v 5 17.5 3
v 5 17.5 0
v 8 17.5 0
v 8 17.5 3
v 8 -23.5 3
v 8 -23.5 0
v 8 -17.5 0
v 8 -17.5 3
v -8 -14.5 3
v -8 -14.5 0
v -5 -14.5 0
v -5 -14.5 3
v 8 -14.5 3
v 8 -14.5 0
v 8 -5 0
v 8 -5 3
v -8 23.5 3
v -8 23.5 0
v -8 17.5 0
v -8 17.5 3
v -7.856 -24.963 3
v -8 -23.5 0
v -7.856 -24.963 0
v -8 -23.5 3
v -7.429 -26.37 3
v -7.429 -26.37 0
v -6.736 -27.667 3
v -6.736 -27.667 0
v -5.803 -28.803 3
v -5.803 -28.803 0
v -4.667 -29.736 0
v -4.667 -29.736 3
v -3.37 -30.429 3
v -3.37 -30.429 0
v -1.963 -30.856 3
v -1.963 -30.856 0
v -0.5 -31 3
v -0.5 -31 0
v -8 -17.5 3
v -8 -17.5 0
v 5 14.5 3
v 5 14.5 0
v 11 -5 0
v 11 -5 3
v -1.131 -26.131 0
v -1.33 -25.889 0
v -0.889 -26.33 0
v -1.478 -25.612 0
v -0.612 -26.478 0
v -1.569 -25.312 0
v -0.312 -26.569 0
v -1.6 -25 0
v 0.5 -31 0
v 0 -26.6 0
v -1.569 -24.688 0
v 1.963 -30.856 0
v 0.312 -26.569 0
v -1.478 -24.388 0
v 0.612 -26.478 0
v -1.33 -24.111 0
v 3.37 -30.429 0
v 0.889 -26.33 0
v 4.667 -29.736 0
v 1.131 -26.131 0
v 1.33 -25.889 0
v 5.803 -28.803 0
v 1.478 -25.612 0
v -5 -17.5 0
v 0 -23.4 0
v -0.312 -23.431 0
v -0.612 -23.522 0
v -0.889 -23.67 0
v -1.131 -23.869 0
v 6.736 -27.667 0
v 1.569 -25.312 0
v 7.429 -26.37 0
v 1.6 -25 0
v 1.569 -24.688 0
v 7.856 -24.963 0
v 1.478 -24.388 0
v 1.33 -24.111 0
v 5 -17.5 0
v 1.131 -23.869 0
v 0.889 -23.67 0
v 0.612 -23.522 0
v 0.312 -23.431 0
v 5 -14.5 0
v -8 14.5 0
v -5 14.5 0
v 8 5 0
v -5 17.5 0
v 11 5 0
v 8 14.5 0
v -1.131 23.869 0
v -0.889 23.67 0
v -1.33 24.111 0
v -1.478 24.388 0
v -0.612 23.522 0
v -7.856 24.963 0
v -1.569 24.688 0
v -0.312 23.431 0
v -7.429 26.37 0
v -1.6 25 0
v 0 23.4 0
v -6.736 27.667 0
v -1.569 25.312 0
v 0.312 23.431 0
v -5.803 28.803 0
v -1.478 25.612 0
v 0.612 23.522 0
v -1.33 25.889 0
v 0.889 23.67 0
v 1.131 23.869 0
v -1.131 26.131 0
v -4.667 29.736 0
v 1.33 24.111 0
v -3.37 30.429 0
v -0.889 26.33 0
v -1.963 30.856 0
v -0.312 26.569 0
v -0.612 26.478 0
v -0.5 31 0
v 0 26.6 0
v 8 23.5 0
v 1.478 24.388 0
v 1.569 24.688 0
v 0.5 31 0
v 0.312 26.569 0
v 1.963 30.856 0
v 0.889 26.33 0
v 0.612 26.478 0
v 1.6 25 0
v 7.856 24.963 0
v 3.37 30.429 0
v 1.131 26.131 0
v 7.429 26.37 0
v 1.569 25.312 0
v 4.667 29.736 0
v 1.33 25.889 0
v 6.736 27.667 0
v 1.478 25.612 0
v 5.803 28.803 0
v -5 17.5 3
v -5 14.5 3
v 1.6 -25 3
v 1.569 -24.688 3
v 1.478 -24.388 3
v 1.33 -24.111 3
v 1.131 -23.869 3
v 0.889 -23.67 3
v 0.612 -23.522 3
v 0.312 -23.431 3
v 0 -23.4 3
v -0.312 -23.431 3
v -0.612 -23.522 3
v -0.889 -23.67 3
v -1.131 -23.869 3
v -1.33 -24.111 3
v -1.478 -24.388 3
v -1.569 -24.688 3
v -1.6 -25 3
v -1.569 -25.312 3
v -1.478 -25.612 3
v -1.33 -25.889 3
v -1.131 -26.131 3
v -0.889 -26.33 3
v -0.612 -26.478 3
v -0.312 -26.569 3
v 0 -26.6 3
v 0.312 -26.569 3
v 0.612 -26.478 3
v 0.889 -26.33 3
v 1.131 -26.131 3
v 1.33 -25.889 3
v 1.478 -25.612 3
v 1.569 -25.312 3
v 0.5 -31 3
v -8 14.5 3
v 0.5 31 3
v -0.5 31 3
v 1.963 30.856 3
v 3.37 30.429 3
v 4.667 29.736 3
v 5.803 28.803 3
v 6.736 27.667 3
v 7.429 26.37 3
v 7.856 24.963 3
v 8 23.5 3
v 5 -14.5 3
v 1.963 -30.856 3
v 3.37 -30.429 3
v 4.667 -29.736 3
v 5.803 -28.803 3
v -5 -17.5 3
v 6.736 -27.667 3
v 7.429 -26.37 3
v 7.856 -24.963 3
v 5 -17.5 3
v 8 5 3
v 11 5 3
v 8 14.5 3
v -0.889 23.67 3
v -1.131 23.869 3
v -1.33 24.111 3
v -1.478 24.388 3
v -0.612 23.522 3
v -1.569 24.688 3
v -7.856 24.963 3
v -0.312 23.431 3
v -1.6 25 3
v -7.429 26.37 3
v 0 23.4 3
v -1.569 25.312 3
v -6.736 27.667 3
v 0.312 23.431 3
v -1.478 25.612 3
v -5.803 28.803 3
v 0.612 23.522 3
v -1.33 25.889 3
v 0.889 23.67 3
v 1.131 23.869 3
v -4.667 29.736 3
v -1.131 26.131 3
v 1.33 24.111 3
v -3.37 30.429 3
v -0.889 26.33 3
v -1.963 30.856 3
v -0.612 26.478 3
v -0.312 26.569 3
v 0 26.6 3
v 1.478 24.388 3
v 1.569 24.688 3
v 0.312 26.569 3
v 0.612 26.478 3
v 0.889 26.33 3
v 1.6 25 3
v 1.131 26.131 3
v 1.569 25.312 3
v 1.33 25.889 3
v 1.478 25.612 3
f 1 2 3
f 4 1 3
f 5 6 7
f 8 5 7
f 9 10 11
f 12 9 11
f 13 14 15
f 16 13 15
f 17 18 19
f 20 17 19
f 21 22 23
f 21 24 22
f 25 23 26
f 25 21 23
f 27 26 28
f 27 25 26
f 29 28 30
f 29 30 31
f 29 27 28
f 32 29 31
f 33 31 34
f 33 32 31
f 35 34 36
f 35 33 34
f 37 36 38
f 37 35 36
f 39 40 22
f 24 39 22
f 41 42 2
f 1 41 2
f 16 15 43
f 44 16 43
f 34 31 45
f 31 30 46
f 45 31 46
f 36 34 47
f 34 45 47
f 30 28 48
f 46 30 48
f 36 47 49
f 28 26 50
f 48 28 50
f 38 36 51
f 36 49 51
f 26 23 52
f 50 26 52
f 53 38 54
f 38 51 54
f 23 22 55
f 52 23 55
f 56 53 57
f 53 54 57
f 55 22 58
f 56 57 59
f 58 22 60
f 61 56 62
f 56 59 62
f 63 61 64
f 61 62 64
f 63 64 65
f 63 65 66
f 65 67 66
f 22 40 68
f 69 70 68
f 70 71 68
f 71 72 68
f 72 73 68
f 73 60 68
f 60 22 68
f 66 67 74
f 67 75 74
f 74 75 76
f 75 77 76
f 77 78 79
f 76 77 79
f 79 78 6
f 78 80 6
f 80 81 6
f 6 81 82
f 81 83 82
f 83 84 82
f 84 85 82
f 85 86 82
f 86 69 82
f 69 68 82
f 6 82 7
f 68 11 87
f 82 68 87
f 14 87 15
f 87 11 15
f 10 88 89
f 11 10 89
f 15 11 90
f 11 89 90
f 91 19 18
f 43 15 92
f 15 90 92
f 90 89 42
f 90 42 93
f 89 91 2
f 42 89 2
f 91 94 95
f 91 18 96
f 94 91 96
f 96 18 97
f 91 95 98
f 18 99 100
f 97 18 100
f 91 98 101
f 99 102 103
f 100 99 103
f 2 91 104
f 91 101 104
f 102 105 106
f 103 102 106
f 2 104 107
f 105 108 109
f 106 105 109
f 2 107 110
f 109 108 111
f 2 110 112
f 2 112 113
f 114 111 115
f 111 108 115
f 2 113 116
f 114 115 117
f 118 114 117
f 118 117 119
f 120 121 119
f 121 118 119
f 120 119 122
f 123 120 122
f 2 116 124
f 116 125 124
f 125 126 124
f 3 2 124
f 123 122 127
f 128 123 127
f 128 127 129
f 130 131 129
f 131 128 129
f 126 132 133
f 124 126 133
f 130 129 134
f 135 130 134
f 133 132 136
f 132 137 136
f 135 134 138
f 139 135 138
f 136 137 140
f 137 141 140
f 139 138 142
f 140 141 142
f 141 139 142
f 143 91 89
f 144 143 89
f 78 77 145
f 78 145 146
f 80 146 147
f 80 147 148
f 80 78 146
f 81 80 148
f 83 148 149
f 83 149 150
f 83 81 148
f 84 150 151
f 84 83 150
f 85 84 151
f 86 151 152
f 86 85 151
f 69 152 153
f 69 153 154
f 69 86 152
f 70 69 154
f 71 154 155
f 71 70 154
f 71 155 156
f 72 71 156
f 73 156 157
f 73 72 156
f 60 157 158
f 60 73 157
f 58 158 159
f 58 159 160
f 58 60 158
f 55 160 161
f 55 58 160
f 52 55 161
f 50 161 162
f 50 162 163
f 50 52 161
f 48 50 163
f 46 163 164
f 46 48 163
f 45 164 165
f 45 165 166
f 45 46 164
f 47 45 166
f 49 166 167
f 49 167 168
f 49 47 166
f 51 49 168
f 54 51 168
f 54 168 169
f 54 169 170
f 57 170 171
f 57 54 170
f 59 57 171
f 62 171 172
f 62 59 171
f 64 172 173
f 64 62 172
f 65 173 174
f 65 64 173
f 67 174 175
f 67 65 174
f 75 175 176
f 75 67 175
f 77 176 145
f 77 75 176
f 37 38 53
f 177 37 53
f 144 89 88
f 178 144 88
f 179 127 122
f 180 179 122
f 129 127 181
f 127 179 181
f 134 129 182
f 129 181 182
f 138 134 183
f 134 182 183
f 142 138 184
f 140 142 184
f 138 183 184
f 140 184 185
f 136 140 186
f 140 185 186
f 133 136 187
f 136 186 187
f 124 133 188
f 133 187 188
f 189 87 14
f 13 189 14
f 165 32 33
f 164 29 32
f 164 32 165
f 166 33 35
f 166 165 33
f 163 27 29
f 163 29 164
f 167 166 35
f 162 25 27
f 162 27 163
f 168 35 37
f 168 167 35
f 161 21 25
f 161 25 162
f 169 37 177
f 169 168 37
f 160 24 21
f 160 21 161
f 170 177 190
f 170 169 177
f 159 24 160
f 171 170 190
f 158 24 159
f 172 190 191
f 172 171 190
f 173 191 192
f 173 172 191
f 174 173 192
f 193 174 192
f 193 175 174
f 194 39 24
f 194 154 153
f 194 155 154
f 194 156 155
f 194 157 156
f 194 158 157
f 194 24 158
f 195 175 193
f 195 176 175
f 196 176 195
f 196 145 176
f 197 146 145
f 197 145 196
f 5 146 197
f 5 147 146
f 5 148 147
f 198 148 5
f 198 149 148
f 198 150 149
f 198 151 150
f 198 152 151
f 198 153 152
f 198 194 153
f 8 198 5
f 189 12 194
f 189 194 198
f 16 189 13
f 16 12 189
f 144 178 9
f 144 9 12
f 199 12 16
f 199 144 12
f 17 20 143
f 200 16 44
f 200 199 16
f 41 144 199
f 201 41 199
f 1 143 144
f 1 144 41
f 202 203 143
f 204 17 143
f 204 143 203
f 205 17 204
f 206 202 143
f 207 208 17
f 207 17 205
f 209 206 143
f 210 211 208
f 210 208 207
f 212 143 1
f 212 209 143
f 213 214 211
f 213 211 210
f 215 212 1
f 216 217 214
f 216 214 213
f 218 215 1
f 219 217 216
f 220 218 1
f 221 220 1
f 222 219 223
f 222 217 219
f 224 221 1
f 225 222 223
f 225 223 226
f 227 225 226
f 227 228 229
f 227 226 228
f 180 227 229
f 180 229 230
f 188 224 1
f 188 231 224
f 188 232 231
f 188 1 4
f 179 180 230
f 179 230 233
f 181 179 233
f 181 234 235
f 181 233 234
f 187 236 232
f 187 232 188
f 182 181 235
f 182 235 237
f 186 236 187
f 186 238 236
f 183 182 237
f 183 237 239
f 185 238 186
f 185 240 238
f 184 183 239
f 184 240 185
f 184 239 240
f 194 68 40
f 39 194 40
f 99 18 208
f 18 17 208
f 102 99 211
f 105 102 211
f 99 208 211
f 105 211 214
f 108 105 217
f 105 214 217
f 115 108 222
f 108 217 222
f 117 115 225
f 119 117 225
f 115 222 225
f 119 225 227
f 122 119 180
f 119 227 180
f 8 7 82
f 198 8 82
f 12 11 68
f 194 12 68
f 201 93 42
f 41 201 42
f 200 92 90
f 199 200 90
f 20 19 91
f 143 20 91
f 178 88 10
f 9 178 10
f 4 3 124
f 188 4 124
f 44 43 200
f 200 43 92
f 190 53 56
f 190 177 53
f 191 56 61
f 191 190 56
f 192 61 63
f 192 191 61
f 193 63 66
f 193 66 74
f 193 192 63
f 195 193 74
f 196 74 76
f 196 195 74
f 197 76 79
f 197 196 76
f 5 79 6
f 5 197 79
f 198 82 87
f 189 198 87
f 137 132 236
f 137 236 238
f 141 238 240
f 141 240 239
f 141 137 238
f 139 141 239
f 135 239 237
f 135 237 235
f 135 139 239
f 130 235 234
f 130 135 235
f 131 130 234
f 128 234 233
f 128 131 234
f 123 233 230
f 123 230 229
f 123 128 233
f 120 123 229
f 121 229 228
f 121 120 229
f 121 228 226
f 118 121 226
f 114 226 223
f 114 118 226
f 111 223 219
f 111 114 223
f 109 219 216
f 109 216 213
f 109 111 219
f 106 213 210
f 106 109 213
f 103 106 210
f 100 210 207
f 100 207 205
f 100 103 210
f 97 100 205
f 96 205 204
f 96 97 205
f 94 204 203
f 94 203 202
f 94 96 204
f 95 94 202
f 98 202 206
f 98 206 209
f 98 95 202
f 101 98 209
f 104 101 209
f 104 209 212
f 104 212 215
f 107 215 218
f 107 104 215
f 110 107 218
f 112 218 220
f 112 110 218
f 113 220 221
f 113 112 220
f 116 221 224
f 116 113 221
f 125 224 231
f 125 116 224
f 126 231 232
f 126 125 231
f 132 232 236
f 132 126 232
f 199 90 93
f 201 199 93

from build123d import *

# Parameters (mm, degrees)
ESBO_O1_R                = 1.6
RESSALTO_EXTRUS_O1_DEPTH = 3
FILETE1_R                = 7.5


with BuildPart() as part:
    # Esboço1 → Ressalto-extrusão1 (new body)
    with BuildSketch(Plane.XY):
        Polygon((-8, 14.5), (-8, -14.5), (-5, -14.5), (-5, -17.5), (-8, -17.5), (-8, -31), (8, -31), (8, -17.5), (5, -17.5), (5, -14.5), (8, -14.5), (8, -5), (11, -5), (11, 5), (8, 5), (8, 14.5), (5, 14.5), (5, 17.5), (8, 17.5), (8, 31), (-8, 31), (-8, 17.5), (-5, 17.5), (-5, 14.5), align=None)
        with Locations((0, -25)):
            Circle(ESBO_O1_R, mode=Mode.SUBTRACT)
        with Locations((0, 25)):
            Circle(ESBO_O1_R, mode=Mode.SUBTRACT)
    extrude(amount=RESSALTO_EXTRUS_O1_DEPTH)

    # Filete1
    filete1_edges = [part.edges().sort_by_distance(p)[0] for p in [
        (-8, 31, 1.5),
        (8, 31, 1.5),
        (8, -31, 1.5),
        (-8, -31, 1.5),
    ]]
    fillet(filete1_edges, radius=FILETE1_R)


solid = part.part
